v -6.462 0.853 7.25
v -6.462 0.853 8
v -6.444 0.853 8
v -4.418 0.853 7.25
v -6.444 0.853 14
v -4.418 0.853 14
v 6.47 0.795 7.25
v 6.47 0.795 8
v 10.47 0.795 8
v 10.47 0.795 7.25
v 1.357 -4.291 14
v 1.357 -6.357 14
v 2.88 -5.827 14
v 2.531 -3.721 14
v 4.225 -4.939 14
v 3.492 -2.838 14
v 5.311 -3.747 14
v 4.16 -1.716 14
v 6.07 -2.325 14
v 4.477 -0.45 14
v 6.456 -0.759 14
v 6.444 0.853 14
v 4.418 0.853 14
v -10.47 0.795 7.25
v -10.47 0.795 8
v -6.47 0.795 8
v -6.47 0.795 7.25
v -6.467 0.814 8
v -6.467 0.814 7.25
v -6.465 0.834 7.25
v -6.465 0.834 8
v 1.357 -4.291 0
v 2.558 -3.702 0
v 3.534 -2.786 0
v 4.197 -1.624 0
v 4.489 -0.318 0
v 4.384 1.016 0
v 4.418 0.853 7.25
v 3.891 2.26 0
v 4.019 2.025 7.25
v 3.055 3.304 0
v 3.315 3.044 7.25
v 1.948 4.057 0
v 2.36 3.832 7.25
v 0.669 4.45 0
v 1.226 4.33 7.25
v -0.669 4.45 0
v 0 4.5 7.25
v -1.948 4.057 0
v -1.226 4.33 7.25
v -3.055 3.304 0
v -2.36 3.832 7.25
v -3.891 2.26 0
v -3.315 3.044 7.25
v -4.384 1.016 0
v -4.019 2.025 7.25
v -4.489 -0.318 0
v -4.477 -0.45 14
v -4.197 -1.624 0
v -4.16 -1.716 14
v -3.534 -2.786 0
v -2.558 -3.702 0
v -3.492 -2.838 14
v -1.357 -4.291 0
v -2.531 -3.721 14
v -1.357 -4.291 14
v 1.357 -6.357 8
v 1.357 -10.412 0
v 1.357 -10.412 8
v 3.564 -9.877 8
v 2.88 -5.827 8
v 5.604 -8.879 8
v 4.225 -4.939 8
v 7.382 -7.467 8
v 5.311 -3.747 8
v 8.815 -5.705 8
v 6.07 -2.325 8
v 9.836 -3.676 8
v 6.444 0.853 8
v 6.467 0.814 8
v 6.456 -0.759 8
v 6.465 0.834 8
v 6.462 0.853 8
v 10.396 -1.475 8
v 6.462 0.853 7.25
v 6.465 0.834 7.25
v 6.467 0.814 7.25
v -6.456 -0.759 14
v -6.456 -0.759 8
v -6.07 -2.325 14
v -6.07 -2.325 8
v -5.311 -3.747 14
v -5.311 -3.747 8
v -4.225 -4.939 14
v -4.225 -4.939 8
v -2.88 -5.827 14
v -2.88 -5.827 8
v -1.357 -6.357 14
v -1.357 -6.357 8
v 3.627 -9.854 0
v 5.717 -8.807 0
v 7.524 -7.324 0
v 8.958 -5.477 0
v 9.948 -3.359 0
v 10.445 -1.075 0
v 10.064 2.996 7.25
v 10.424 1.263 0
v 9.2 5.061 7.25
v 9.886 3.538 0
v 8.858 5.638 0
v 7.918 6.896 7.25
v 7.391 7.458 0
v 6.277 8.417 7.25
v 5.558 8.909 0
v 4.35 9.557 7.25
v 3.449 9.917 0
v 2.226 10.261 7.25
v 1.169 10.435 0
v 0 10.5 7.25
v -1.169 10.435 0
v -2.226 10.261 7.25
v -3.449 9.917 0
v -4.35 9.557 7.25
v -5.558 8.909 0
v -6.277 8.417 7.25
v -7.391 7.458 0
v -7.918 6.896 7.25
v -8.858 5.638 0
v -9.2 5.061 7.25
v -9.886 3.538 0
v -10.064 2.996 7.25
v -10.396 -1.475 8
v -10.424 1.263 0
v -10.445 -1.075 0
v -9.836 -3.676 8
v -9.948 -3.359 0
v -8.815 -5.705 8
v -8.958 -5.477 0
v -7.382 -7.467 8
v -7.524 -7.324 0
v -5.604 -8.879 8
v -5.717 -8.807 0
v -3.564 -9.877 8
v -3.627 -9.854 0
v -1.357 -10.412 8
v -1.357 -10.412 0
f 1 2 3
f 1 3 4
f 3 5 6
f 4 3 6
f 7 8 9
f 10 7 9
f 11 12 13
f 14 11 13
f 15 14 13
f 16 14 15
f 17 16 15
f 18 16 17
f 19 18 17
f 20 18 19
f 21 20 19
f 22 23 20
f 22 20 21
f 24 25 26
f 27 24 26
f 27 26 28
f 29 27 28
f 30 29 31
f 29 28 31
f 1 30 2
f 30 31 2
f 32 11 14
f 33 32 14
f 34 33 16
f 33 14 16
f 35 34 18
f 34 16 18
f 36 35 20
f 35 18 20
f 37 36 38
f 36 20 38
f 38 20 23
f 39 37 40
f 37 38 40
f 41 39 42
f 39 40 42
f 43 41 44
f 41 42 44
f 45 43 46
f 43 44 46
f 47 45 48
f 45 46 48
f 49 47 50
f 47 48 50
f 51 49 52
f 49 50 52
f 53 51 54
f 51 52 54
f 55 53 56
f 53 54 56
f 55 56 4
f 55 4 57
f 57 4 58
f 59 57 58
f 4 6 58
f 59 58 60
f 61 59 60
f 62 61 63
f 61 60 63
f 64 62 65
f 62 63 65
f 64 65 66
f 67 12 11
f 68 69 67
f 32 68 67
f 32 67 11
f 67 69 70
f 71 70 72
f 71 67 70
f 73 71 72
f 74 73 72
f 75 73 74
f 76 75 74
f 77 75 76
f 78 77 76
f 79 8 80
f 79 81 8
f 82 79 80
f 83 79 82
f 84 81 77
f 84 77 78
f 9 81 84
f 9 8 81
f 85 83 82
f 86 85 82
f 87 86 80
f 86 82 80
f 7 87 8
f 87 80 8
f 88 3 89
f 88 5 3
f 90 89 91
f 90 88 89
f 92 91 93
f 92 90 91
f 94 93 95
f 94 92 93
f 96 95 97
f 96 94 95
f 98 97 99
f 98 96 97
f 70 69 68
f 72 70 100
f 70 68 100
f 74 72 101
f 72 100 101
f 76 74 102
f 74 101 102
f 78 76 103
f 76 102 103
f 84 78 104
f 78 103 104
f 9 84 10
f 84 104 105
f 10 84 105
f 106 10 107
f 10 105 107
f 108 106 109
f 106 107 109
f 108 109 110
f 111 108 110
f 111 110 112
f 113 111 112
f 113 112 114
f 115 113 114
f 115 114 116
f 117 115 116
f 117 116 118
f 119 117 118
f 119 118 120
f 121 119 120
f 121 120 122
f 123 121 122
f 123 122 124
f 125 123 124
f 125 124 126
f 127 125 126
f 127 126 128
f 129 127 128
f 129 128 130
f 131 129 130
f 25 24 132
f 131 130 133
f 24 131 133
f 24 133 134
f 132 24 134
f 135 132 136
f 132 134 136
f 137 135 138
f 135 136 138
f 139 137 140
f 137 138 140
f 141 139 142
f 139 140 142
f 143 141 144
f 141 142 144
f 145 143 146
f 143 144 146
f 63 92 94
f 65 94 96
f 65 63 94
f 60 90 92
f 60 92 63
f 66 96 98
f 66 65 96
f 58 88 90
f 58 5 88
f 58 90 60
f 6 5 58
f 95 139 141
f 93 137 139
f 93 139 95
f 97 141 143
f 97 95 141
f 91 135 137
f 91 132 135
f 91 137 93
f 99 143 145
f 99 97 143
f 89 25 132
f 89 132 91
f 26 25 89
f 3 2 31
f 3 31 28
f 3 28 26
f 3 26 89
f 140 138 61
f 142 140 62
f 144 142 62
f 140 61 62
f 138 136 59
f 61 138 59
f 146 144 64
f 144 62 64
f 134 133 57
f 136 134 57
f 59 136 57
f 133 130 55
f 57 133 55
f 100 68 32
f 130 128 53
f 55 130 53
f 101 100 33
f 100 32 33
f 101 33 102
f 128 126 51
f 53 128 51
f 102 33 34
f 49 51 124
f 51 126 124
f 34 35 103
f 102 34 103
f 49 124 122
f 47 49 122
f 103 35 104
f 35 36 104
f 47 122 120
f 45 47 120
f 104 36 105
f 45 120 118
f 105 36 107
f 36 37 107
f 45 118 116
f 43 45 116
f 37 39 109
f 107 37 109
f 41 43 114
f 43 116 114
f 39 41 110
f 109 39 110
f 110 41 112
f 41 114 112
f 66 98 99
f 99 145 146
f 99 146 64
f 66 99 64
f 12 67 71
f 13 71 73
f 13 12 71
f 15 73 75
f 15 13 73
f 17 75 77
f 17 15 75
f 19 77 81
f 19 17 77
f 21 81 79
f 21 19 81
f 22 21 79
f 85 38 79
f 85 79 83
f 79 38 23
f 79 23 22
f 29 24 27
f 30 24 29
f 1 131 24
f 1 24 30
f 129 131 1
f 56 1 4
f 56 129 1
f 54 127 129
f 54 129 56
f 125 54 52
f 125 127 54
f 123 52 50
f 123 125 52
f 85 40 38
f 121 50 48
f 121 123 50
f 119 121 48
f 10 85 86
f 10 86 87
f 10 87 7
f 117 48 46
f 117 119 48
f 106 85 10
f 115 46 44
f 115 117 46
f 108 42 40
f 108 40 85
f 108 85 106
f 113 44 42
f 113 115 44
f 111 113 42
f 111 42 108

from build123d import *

# Parameters (mm, degrees)
F0_R      = 10.5
F1_DEPTH  = 14
F2_R      = 10.5
F2_R_2    = 6.5
F3_DEPTH  = 6
F4_R      = 4.5
F5_DEPTH  = 14.001
F6_W      = 2.713612
F6_H      = 7.583218
F7_DEPTH  = 14.001
F9_DEPTH  = 6.75
F10_W     = 22.774708
F10_H     = 11.08392
F11_DEPTH = 6.75


with BuildPart() as f1:
    # F0 (on Top) → F1 (new body)
    with BuildSketch(Plane.XY):
        Circle(F0_R)
    extrude(amount=F1_DEPTH)

    # F2 (on face) → F3 (cut)
    with BuildSketch(Plane.XY.offset(14)):
        Circle(F2_R)
        Circle(F2_R_2, mode=Mode.SUBTRACT)
    extrude(amount=-F3_DEPTH, mode=Mode.SUBTRACT)

    # F4 (on face) → F5 (cut, through all)
    with BuildSketch(Plane.XY.offset(14)):
        Circle(F4_R)
    extrude(amount=-F5_DEPTH, mode=Mode.SUBTRACT)

    # F6 (on Top) → F7 (cut, through all)
    with BuildSketch(Plane.XY):
        with Locations((0, -7.369267)):
            Rectangle(F6_W, F6_H)
    extrude(amount=F7_DEPTH, mode=Mode.SUBTRACT)

    # F8 (on face) → F9 (cut)
    with BuildSketch(Plane.XY.offset(14)):
        with BuildLine():
            ThreePointArc((10.981682, 0.794768), (0, 11.010404), (-10.981682, 0.794768))
            Line((-10.981682, 0.794768), (-6.469861, 0.794768))
            ThreePointArc((-6.469861, 0.794768), (0, 6.518493), (6.469861, 0.794768))
            Line((6.469861, 0.794768), (10.981682, 0.794768))
        make_face()
    extrude(amount=-F9_DEPTH, mode=Mode.SUBTRACT)

    # F10 (on face) → F11 (cut)
    with BuildSketch(Plane.XY.offset(14)):
        with Locations((-0.604641, 6.395375)):
            Rectangle(F10_W, F10_H)
    extrude(amount=-F11_DEPTH, mode=Mode.SUBTRACT)


solid = f1.part
